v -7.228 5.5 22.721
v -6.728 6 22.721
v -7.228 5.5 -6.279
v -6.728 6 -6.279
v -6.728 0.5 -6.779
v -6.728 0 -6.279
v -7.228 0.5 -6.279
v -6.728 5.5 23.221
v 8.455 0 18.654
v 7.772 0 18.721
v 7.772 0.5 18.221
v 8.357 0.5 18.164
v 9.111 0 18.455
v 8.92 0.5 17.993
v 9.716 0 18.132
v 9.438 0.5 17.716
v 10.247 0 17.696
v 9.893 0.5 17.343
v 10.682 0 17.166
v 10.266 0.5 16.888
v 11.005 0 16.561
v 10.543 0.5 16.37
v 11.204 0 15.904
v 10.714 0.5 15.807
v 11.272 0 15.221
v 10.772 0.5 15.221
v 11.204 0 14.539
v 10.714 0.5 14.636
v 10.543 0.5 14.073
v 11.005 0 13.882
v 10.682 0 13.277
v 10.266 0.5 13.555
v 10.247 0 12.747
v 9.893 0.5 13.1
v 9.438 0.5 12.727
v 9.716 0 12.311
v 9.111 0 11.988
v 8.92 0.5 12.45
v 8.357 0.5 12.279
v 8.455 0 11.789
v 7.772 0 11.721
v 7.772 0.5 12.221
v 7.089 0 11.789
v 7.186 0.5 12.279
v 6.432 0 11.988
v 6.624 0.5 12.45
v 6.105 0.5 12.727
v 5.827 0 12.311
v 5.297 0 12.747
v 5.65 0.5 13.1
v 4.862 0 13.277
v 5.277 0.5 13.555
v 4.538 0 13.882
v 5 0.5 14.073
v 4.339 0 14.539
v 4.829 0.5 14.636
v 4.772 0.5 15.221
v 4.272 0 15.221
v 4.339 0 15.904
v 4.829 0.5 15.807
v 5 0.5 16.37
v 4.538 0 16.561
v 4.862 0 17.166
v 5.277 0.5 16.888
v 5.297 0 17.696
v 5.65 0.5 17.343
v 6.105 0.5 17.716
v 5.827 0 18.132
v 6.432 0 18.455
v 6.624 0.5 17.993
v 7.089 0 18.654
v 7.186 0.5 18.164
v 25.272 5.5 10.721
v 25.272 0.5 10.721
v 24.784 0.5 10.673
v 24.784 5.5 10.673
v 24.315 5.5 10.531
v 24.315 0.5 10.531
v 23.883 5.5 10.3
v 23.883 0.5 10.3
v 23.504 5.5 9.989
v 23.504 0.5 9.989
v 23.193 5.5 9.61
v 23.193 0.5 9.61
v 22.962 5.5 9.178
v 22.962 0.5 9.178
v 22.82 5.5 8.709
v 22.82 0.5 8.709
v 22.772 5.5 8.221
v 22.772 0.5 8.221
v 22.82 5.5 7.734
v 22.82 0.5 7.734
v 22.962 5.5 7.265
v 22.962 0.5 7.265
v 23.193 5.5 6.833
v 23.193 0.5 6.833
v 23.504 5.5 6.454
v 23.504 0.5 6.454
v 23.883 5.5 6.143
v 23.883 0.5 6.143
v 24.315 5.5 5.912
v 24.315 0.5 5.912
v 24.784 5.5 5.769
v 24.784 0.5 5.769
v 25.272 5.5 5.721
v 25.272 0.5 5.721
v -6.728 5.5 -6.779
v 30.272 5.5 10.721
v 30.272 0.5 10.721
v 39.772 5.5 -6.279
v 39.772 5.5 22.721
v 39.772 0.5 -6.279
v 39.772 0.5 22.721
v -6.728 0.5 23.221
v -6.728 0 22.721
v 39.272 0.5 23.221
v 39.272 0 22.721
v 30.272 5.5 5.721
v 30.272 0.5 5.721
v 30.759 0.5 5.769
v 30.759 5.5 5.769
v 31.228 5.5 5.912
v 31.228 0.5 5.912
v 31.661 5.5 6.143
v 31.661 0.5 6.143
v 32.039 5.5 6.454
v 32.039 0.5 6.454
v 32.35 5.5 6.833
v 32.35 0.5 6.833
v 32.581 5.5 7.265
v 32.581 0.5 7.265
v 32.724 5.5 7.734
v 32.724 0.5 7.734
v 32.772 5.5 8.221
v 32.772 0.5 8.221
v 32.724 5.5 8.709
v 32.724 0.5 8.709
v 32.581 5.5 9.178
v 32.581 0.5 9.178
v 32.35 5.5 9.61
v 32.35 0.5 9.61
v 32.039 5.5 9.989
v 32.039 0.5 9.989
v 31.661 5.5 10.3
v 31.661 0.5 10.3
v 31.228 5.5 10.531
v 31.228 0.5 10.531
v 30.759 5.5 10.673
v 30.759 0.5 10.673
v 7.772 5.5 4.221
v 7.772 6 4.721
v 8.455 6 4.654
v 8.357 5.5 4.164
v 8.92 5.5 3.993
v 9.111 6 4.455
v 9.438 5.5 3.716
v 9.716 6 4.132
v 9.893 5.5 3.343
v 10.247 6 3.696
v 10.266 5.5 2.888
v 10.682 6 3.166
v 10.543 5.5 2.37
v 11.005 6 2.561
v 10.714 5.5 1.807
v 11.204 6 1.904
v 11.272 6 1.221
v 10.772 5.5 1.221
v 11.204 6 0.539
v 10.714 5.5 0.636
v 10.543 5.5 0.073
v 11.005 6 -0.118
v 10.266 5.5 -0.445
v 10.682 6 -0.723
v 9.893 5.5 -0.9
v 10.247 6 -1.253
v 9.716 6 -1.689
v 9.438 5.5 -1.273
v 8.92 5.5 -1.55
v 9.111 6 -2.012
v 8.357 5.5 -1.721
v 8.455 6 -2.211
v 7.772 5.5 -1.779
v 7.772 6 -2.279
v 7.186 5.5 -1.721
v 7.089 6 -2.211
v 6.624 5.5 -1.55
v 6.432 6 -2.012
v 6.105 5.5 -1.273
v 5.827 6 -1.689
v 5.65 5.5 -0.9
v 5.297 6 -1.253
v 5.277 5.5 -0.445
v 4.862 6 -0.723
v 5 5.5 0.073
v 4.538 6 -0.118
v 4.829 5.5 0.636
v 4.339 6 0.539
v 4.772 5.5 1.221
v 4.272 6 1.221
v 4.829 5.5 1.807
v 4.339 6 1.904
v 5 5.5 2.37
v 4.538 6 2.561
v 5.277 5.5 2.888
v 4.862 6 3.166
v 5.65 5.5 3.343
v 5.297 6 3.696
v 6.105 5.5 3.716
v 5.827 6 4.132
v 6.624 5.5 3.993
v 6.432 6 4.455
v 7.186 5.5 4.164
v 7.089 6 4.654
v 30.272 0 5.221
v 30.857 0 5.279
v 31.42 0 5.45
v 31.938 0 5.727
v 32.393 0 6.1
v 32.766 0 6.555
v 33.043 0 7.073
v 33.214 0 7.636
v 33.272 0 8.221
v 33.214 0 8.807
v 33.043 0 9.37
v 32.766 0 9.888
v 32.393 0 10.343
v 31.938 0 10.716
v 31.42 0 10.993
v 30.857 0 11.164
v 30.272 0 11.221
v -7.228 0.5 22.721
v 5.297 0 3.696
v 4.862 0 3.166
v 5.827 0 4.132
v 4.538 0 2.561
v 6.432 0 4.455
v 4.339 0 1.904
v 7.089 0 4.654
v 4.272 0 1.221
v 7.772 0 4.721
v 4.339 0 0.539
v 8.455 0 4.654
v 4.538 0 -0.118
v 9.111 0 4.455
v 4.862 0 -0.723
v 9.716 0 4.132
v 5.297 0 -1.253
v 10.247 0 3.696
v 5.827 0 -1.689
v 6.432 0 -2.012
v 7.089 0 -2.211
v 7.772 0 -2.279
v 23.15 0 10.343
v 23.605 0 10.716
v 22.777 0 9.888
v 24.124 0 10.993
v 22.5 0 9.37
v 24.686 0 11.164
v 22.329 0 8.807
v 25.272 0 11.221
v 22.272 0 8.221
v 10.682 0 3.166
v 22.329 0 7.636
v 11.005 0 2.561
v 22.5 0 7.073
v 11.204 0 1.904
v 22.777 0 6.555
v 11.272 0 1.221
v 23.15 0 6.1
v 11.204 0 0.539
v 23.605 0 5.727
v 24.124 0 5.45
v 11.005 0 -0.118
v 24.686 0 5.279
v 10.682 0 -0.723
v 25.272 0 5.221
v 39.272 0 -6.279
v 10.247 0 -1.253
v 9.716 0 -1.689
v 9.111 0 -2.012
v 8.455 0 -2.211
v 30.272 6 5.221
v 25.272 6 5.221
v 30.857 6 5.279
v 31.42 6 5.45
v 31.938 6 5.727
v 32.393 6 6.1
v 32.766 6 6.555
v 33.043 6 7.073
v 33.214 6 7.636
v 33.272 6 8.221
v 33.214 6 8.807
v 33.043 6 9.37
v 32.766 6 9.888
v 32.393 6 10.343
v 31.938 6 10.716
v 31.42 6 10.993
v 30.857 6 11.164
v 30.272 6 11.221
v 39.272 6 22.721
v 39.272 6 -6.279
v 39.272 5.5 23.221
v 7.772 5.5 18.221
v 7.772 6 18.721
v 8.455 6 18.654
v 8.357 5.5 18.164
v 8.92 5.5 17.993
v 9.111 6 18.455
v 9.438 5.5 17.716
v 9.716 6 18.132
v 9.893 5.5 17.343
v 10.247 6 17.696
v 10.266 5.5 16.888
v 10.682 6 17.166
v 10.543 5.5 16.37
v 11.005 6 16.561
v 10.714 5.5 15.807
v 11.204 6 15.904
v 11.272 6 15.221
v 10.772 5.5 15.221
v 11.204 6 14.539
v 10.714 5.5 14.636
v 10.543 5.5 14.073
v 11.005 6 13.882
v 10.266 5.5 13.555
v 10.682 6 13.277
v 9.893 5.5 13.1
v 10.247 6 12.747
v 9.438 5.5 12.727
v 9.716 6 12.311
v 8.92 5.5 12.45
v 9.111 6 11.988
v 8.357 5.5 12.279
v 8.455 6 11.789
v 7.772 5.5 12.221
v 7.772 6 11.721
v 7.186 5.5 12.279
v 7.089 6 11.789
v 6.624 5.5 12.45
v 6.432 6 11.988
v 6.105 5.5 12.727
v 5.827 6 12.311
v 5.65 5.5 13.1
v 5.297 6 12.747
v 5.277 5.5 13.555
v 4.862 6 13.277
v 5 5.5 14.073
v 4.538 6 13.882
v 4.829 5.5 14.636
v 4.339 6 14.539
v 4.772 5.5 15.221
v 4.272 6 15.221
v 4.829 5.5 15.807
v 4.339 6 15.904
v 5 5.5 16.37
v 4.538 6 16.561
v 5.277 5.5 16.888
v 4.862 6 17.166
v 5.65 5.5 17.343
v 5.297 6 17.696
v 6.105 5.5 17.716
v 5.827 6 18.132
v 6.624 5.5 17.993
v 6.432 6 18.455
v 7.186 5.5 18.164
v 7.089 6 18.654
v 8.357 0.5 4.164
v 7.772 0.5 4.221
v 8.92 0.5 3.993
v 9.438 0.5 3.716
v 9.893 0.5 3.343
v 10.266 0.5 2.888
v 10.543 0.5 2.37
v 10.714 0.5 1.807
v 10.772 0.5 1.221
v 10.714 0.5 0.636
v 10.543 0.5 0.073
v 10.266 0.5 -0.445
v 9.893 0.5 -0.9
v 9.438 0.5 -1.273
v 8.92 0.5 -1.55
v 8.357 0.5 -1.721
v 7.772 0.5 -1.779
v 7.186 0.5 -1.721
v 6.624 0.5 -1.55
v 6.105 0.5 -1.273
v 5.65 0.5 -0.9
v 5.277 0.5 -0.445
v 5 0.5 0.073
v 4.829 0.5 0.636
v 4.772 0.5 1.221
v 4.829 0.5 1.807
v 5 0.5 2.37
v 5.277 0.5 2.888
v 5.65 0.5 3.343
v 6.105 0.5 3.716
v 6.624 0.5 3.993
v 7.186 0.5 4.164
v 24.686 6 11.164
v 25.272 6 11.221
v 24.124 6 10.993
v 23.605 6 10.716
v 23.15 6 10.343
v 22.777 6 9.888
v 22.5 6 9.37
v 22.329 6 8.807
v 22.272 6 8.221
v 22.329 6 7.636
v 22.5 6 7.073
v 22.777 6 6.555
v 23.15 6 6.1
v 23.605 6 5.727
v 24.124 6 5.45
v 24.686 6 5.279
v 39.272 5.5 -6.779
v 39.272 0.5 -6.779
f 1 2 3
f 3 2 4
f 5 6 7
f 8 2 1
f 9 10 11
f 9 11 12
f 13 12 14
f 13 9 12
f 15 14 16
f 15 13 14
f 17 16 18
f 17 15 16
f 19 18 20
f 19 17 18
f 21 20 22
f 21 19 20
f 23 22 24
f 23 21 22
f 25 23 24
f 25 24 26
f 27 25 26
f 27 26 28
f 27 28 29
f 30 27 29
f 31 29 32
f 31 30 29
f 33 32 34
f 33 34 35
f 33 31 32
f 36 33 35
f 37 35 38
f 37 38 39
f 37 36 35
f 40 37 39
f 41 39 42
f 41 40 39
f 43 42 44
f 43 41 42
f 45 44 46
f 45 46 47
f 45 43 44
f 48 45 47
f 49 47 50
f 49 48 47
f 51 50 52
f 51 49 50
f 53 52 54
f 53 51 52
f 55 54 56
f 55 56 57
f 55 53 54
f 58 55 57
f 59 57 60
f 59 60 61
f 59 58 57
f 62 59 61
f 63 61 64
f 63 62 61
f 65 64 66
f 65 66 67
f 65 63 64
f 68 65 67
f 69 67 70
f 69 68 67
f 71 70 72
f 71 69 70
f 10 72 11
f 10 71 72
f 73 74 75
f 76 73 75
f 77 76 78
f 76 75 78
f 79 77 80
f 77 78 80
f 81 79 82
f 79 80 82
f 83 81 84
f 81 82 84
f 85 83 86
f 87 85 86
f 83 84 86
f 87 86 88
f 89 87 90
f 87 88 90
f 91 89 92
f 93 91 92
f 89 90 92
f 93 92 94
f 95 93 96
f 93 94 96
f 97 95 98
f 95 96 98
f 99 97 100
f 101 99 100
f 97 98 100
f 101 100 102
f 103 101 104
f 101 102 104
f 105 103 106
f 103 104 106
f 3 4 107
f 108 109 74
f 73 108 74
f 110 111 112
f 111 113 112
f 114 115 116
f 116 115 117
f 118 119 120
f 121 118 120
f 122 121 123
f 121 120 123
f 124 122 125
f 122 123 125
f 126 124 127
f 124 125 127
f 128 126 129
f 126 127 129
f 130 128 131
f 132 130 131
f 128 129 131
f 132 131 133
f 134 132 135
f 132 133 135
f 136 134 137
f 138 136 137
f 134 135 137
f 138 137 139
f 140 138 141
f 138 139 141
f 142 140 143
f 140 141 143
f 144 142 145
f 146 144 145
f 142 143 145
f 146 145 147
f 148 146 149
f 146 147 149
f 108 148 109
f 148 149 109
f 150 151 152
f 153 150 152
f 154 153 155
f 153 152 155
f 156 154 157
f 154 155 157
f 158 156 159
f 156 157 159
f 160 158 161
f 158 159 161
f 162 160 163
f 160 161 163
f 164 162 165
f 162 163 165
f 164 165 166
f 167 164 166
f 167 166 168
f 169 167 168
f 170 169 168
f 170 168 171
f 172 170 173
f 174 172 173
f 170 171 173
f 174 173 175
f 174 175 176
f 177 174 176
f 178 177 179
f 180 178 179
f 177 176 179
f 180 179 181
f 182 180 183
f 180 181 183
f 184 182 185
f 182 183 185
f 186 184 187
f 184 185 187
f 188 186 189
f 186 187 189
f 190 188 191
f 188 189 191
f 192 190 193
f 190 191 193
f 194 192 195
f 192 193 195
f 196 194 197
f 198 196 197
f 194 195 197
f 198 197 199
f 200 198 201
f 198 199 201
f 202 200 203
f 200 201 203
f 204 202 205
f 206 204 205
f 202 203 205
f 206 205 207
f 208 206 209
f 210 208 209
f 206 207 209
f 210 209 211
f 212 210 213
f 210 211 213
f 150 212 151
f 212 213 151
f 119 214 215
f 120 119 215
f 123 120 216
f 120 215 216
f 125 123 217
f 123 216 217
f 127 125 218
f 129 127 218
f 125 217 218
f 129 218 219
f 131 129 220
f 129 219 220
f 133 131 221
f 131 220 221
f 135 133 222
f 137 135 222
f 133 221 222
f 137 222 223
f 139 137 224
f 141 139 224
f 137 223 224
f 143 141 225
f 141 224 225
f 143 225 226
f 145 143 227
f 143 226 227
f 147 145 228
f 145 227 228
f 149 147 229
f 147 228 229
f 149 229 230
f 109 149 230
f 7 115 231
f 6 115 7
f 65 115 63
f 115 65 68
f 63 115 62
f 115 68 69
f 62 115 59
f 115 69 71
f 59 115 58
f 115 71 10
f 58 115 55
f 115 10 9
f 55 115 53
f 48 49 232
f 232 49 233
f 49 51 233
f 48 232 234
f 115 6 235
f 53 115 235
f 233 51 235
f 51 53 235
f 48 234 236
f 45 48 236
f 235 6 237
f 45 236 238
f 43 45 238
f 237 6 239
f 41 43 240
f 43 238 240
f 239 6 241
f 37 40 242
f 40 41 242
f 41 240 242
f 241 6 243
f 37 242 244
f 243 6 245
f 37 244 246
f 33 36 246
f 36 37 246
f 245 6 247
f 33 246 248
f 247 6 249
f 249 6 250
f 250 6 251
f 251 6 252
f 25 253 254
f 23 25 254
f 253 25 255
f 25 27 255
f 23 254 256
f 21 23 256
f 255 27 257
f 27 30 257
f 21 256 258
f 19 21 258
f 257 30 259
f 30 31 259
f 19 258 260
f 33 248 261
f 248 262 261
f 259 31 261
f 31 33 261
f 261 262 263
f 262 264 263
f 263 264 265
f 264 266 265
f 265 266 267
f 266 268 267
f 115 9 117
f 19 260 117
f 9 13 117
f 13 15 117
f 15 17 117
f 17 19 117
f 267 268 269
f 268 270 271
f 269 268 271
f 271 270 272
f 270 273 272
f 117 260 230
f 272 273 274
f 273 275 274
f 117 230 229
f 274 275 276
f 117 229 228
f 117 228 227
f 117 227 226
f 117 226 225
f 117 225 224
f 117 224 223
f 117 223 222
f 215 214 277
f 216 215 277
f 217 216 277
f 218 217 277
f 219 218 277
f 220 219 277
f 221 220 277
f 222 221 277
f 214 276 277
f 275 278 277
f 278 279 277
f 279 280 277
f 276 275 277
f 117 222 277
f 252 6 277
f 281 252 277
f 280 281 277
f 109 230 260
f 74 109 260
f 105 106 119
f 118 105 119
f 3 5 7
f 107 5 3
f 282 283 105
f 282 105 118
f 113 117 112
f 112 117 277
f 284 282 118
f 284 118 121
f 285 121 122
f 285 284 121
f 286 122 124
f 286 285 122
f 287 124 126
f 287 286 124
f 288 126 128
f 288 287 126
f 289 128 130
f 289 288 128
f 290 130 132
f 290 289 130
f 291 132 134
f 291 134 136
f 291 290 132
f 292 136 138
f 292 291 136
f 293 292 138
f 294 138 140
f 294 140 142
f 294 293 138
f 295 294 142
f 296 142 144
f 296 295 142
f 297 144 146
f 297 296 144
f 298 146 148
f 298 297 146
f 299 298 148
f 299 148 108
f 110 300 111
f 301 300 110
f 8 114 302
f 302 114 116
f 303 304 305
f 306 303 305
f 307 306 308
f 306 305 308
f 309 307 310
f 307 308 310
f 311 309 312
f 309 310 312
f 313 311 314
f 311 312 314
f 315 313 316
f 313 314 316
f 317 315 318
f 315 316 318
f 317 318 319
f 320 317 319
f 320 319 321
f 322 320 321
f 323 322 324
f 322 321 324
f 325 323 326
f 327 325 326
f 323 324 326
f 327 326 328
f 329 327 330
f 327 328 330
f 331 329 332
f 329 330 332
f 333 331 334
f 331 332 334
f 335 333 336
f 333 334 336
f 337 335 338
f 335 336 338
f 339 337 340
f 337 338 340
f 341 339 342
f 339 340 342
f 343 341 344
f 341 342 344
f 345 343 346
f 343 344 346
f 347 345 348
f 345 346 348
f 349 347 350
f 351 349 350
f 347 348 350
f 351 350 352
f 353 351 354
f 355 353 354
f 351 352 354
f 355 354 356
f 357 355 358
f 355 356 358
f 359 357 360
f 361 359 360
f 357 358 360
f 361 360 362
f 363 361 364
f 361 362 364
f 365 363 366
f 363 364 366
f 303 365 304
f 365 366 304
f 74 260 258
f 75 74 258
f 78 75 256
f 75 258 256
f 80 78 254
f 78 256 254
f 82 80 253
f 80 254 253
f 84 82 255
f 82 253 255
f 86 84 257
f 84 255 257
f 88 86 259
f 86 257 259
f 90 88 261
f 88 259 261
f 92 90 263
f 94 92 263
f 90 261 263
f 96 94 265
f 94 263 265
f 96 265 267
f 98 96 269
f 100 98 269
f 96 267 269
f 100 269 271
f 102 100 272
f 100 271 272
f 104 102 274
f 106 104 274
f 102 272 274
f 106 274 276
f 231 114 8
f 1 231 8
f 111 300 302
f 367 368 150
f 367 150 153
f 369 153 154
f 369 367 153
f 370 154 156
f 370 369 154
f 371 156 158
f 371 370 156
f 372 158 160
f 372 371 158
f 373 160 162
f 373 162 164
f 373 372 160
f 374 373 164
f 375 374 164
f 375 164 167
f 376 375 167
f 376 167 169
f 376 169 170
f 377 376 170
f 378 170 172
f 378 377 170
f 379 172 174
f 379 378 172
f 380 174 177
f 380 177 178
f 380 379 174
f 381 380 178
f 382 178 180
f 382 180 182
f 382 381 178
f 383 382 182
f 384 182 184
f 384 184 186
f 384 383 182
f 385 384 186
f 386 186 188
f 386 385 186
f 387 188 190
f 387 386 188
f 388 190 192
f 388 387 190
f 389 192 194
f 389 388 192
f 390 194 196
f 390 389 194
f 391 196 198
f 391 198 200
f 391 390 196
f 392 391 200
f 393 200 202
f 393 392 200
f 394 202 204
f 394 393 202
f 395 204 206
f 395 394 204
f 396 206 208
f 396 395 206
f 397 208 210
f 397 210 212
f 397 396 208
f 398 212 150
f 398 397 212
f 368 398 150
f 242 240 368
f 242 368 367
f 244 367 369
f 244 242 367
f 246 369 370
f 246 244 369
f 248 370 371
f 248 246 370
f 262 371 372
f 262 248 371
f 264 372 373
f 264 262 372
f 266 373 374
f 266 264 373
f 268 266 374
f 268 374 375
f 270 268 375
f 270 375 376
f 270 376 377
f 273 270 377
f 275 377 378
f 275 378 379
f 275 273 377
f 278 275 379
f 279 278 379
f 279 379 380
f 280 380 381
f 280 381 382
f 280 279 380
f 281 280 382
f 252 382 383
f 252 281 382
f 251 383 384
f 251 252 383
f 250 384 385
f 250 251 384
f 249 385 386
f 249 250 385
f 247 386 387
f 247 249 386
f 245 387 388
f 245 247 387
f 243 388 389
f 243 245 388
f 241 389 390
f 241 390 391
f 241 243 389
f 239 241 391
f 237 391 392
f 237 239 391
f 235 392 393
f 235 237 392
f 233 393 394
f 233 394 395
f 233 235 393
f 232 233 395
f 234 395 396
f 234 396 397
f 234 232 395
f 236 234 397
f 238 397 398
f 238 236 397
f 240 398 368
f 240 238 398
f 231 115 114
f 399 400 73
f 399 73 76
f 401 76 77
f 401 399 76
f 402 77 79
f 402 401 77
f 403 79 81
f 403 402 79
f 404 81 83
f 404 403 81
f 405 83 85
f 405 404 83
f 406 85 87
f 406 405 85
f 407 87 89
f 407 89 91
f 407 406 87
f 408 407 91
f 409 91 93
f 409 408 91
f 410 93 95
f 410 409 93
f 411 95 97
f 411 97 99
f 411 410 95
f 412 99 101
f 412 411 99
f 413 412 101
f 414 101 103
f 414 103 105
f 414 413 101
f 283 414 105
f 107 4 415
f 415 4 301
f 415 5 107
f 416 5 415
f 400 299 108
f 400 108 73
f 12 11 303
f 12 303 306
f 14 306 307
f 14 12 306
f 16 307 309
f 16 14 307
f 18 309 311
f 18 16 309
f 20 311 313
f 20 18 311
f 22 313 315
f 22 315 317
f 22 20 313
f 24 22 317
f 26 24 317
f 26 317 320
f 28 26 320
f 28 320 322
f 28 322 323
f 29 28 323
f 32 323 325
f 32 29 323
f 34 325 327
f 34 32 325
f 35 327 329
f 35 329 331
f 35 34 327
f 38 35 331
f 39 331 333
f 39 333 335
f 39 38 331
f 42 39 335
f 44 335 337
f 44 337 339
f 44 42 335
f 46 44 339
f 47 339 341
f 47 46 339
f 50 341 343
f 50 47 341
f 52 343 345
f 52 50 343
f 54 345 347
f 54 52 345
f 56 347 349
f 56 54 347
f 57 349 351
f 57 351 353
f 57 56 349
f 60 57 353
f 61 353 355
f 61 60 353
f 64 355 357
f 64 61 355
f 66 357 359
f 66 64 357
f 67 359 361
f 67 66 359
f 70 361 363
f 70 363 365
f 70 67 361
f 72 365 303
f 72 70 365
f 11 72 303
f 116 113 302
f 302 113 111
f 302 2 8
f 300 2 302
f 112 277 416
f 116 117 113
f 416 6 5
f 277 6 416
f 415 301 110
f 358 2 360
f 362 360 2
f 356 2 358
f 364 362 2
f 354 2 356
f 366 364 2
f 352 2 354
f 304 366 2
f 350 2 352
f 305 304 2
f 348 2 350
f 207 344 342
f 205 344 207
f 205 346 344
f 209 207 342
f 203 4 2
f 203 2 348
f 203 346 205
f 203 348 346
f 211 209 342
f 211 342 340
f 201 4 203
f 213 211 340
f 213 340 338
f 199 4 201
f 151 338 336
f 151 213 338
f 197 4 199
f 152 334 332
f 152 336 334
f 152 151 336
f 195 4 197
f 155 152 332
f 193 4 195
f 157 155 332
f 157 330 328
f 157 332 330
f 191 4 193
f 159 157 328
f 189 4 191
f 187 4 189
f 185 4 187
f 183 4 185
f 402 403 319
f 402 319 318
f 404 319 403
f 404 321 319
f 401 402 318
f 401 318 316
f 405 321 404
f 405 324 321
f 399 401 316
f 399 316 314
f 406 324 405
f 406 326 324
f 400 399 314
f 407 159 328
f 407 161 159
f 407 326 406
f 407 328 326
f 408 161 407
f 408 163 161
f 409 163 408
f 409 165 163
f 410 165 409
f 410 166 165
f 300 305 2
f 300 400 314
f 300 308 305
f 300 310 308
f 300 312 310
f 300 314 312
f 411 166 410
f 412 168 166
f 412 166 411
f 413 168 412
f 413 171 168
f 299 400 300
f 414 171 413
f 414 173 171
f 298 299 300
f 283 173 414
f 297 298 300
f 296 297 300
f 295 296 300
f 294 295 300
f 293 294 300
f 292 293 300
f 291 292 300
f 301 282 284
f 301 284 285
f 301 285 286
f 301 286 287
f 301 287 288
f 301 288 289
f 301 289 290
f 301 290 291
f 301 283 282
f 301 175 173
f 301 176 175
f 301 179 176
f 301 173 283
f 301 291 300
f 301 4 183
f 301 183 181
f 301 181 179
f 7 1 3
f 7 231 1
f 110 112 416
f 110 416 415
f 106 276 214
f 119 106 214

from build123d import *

# Parameters (mm, degrees)
CROQUIS1_W              = 47
CROQUIS1_H              = 30
CROQUIS1_R              = 3
SALIENTE_EXTRUIR1_DEPTH = 6
CHAFL_N1_SIZE           = 0.5


with BuildPart() as part:
    # Croquis1 → Saliente-Extruir1 (new body)
    with BuildSketch(Plane(origin=(0, 0, 0), x_dir=(1, 0, 0), z_dir=(0, 1, 0))):
        with Locations((16.271686308, -8.221461187)):
            Rectangle(CROQUIS1_W, CROQUIS1_H)
        with Locations(Location((7.771686308, -1.221461187, 0), (0, 0, 270))):
            Circle(CROQUIS1_R, mode=Mode.SUBTRACT)
        with Locations(Location((7.771686308, -15.221461187, 0), (0, 0, 270))):
            Circle(CROQUIS1_R, mode=Mode.SUBTRACT)
        with BuildLine():
            Line((30.271686308, -10.721461187), (25.271686308, -10.721461187))
            ThreePointArc((25.271686308, -10.721461187), (22.771686308, -8.221461187), (25.271686308, -5.721461187))
            Line((25.271686308, -5.721461187), (30.271686308, -5.721461187))
            ThreePointArc((30.271686308, -5.721461187), (32.771686308, -8.221461187), (30.271686308, -10.721461187))
        make_face(mode=Mode.SUBTRACT)
    extrude(amount=SALIENTE_EXTRUIR1_DEPTH)

    # Chaflán1
    chafl_n1_edges = [part.edges().sort_by_distance(p)[0] for p in [
        (39.771686308, 6, 8.221461187),
        (16.271686308, 6, -6.778538813),
        (32.771686308, 0, 8.221461187),
        (27.771686308, 0, 5.721461187),
        (22.771686308, 0, 8.221461187),
        (27.771686308, 0, 10.721461187),
        (32.771686308, 6, 8.221461187),
        (27.771686308, 6, 5.721461187),
        (22.771686308, 6, 8.221461187),
        (27.771686308, 6, 10.721461187),
        (7.771686308, 0, -1.778538813),
        (7.771686308, 6, -1.778538813),
        (7.771686308, 0, 12.221461187),
        (7.771686308, 6, 12.221461187),
        (-7.228313692, 6, 8.221461187),
        (16.271686308, 0, -6.778538813),
        (39.771686308, 0, 8.221461187),
        (16.271686308, 0, 23.221461187),
        (-7.228313692, 0, 8.221461187),
        (16.271686308, 6, 23.221461187),
        (-7.228313692, 3, -6.778538813),
        (39.771686308, 3, -6.778538813),
        (39.771686308, 3, 23.221461187),
        (-7.228313692, 3, 23.221461187),
    ]]
    chamfer(chafl_n1_edges, length=CHAFL_N1_SIZE)


solid = part.part
